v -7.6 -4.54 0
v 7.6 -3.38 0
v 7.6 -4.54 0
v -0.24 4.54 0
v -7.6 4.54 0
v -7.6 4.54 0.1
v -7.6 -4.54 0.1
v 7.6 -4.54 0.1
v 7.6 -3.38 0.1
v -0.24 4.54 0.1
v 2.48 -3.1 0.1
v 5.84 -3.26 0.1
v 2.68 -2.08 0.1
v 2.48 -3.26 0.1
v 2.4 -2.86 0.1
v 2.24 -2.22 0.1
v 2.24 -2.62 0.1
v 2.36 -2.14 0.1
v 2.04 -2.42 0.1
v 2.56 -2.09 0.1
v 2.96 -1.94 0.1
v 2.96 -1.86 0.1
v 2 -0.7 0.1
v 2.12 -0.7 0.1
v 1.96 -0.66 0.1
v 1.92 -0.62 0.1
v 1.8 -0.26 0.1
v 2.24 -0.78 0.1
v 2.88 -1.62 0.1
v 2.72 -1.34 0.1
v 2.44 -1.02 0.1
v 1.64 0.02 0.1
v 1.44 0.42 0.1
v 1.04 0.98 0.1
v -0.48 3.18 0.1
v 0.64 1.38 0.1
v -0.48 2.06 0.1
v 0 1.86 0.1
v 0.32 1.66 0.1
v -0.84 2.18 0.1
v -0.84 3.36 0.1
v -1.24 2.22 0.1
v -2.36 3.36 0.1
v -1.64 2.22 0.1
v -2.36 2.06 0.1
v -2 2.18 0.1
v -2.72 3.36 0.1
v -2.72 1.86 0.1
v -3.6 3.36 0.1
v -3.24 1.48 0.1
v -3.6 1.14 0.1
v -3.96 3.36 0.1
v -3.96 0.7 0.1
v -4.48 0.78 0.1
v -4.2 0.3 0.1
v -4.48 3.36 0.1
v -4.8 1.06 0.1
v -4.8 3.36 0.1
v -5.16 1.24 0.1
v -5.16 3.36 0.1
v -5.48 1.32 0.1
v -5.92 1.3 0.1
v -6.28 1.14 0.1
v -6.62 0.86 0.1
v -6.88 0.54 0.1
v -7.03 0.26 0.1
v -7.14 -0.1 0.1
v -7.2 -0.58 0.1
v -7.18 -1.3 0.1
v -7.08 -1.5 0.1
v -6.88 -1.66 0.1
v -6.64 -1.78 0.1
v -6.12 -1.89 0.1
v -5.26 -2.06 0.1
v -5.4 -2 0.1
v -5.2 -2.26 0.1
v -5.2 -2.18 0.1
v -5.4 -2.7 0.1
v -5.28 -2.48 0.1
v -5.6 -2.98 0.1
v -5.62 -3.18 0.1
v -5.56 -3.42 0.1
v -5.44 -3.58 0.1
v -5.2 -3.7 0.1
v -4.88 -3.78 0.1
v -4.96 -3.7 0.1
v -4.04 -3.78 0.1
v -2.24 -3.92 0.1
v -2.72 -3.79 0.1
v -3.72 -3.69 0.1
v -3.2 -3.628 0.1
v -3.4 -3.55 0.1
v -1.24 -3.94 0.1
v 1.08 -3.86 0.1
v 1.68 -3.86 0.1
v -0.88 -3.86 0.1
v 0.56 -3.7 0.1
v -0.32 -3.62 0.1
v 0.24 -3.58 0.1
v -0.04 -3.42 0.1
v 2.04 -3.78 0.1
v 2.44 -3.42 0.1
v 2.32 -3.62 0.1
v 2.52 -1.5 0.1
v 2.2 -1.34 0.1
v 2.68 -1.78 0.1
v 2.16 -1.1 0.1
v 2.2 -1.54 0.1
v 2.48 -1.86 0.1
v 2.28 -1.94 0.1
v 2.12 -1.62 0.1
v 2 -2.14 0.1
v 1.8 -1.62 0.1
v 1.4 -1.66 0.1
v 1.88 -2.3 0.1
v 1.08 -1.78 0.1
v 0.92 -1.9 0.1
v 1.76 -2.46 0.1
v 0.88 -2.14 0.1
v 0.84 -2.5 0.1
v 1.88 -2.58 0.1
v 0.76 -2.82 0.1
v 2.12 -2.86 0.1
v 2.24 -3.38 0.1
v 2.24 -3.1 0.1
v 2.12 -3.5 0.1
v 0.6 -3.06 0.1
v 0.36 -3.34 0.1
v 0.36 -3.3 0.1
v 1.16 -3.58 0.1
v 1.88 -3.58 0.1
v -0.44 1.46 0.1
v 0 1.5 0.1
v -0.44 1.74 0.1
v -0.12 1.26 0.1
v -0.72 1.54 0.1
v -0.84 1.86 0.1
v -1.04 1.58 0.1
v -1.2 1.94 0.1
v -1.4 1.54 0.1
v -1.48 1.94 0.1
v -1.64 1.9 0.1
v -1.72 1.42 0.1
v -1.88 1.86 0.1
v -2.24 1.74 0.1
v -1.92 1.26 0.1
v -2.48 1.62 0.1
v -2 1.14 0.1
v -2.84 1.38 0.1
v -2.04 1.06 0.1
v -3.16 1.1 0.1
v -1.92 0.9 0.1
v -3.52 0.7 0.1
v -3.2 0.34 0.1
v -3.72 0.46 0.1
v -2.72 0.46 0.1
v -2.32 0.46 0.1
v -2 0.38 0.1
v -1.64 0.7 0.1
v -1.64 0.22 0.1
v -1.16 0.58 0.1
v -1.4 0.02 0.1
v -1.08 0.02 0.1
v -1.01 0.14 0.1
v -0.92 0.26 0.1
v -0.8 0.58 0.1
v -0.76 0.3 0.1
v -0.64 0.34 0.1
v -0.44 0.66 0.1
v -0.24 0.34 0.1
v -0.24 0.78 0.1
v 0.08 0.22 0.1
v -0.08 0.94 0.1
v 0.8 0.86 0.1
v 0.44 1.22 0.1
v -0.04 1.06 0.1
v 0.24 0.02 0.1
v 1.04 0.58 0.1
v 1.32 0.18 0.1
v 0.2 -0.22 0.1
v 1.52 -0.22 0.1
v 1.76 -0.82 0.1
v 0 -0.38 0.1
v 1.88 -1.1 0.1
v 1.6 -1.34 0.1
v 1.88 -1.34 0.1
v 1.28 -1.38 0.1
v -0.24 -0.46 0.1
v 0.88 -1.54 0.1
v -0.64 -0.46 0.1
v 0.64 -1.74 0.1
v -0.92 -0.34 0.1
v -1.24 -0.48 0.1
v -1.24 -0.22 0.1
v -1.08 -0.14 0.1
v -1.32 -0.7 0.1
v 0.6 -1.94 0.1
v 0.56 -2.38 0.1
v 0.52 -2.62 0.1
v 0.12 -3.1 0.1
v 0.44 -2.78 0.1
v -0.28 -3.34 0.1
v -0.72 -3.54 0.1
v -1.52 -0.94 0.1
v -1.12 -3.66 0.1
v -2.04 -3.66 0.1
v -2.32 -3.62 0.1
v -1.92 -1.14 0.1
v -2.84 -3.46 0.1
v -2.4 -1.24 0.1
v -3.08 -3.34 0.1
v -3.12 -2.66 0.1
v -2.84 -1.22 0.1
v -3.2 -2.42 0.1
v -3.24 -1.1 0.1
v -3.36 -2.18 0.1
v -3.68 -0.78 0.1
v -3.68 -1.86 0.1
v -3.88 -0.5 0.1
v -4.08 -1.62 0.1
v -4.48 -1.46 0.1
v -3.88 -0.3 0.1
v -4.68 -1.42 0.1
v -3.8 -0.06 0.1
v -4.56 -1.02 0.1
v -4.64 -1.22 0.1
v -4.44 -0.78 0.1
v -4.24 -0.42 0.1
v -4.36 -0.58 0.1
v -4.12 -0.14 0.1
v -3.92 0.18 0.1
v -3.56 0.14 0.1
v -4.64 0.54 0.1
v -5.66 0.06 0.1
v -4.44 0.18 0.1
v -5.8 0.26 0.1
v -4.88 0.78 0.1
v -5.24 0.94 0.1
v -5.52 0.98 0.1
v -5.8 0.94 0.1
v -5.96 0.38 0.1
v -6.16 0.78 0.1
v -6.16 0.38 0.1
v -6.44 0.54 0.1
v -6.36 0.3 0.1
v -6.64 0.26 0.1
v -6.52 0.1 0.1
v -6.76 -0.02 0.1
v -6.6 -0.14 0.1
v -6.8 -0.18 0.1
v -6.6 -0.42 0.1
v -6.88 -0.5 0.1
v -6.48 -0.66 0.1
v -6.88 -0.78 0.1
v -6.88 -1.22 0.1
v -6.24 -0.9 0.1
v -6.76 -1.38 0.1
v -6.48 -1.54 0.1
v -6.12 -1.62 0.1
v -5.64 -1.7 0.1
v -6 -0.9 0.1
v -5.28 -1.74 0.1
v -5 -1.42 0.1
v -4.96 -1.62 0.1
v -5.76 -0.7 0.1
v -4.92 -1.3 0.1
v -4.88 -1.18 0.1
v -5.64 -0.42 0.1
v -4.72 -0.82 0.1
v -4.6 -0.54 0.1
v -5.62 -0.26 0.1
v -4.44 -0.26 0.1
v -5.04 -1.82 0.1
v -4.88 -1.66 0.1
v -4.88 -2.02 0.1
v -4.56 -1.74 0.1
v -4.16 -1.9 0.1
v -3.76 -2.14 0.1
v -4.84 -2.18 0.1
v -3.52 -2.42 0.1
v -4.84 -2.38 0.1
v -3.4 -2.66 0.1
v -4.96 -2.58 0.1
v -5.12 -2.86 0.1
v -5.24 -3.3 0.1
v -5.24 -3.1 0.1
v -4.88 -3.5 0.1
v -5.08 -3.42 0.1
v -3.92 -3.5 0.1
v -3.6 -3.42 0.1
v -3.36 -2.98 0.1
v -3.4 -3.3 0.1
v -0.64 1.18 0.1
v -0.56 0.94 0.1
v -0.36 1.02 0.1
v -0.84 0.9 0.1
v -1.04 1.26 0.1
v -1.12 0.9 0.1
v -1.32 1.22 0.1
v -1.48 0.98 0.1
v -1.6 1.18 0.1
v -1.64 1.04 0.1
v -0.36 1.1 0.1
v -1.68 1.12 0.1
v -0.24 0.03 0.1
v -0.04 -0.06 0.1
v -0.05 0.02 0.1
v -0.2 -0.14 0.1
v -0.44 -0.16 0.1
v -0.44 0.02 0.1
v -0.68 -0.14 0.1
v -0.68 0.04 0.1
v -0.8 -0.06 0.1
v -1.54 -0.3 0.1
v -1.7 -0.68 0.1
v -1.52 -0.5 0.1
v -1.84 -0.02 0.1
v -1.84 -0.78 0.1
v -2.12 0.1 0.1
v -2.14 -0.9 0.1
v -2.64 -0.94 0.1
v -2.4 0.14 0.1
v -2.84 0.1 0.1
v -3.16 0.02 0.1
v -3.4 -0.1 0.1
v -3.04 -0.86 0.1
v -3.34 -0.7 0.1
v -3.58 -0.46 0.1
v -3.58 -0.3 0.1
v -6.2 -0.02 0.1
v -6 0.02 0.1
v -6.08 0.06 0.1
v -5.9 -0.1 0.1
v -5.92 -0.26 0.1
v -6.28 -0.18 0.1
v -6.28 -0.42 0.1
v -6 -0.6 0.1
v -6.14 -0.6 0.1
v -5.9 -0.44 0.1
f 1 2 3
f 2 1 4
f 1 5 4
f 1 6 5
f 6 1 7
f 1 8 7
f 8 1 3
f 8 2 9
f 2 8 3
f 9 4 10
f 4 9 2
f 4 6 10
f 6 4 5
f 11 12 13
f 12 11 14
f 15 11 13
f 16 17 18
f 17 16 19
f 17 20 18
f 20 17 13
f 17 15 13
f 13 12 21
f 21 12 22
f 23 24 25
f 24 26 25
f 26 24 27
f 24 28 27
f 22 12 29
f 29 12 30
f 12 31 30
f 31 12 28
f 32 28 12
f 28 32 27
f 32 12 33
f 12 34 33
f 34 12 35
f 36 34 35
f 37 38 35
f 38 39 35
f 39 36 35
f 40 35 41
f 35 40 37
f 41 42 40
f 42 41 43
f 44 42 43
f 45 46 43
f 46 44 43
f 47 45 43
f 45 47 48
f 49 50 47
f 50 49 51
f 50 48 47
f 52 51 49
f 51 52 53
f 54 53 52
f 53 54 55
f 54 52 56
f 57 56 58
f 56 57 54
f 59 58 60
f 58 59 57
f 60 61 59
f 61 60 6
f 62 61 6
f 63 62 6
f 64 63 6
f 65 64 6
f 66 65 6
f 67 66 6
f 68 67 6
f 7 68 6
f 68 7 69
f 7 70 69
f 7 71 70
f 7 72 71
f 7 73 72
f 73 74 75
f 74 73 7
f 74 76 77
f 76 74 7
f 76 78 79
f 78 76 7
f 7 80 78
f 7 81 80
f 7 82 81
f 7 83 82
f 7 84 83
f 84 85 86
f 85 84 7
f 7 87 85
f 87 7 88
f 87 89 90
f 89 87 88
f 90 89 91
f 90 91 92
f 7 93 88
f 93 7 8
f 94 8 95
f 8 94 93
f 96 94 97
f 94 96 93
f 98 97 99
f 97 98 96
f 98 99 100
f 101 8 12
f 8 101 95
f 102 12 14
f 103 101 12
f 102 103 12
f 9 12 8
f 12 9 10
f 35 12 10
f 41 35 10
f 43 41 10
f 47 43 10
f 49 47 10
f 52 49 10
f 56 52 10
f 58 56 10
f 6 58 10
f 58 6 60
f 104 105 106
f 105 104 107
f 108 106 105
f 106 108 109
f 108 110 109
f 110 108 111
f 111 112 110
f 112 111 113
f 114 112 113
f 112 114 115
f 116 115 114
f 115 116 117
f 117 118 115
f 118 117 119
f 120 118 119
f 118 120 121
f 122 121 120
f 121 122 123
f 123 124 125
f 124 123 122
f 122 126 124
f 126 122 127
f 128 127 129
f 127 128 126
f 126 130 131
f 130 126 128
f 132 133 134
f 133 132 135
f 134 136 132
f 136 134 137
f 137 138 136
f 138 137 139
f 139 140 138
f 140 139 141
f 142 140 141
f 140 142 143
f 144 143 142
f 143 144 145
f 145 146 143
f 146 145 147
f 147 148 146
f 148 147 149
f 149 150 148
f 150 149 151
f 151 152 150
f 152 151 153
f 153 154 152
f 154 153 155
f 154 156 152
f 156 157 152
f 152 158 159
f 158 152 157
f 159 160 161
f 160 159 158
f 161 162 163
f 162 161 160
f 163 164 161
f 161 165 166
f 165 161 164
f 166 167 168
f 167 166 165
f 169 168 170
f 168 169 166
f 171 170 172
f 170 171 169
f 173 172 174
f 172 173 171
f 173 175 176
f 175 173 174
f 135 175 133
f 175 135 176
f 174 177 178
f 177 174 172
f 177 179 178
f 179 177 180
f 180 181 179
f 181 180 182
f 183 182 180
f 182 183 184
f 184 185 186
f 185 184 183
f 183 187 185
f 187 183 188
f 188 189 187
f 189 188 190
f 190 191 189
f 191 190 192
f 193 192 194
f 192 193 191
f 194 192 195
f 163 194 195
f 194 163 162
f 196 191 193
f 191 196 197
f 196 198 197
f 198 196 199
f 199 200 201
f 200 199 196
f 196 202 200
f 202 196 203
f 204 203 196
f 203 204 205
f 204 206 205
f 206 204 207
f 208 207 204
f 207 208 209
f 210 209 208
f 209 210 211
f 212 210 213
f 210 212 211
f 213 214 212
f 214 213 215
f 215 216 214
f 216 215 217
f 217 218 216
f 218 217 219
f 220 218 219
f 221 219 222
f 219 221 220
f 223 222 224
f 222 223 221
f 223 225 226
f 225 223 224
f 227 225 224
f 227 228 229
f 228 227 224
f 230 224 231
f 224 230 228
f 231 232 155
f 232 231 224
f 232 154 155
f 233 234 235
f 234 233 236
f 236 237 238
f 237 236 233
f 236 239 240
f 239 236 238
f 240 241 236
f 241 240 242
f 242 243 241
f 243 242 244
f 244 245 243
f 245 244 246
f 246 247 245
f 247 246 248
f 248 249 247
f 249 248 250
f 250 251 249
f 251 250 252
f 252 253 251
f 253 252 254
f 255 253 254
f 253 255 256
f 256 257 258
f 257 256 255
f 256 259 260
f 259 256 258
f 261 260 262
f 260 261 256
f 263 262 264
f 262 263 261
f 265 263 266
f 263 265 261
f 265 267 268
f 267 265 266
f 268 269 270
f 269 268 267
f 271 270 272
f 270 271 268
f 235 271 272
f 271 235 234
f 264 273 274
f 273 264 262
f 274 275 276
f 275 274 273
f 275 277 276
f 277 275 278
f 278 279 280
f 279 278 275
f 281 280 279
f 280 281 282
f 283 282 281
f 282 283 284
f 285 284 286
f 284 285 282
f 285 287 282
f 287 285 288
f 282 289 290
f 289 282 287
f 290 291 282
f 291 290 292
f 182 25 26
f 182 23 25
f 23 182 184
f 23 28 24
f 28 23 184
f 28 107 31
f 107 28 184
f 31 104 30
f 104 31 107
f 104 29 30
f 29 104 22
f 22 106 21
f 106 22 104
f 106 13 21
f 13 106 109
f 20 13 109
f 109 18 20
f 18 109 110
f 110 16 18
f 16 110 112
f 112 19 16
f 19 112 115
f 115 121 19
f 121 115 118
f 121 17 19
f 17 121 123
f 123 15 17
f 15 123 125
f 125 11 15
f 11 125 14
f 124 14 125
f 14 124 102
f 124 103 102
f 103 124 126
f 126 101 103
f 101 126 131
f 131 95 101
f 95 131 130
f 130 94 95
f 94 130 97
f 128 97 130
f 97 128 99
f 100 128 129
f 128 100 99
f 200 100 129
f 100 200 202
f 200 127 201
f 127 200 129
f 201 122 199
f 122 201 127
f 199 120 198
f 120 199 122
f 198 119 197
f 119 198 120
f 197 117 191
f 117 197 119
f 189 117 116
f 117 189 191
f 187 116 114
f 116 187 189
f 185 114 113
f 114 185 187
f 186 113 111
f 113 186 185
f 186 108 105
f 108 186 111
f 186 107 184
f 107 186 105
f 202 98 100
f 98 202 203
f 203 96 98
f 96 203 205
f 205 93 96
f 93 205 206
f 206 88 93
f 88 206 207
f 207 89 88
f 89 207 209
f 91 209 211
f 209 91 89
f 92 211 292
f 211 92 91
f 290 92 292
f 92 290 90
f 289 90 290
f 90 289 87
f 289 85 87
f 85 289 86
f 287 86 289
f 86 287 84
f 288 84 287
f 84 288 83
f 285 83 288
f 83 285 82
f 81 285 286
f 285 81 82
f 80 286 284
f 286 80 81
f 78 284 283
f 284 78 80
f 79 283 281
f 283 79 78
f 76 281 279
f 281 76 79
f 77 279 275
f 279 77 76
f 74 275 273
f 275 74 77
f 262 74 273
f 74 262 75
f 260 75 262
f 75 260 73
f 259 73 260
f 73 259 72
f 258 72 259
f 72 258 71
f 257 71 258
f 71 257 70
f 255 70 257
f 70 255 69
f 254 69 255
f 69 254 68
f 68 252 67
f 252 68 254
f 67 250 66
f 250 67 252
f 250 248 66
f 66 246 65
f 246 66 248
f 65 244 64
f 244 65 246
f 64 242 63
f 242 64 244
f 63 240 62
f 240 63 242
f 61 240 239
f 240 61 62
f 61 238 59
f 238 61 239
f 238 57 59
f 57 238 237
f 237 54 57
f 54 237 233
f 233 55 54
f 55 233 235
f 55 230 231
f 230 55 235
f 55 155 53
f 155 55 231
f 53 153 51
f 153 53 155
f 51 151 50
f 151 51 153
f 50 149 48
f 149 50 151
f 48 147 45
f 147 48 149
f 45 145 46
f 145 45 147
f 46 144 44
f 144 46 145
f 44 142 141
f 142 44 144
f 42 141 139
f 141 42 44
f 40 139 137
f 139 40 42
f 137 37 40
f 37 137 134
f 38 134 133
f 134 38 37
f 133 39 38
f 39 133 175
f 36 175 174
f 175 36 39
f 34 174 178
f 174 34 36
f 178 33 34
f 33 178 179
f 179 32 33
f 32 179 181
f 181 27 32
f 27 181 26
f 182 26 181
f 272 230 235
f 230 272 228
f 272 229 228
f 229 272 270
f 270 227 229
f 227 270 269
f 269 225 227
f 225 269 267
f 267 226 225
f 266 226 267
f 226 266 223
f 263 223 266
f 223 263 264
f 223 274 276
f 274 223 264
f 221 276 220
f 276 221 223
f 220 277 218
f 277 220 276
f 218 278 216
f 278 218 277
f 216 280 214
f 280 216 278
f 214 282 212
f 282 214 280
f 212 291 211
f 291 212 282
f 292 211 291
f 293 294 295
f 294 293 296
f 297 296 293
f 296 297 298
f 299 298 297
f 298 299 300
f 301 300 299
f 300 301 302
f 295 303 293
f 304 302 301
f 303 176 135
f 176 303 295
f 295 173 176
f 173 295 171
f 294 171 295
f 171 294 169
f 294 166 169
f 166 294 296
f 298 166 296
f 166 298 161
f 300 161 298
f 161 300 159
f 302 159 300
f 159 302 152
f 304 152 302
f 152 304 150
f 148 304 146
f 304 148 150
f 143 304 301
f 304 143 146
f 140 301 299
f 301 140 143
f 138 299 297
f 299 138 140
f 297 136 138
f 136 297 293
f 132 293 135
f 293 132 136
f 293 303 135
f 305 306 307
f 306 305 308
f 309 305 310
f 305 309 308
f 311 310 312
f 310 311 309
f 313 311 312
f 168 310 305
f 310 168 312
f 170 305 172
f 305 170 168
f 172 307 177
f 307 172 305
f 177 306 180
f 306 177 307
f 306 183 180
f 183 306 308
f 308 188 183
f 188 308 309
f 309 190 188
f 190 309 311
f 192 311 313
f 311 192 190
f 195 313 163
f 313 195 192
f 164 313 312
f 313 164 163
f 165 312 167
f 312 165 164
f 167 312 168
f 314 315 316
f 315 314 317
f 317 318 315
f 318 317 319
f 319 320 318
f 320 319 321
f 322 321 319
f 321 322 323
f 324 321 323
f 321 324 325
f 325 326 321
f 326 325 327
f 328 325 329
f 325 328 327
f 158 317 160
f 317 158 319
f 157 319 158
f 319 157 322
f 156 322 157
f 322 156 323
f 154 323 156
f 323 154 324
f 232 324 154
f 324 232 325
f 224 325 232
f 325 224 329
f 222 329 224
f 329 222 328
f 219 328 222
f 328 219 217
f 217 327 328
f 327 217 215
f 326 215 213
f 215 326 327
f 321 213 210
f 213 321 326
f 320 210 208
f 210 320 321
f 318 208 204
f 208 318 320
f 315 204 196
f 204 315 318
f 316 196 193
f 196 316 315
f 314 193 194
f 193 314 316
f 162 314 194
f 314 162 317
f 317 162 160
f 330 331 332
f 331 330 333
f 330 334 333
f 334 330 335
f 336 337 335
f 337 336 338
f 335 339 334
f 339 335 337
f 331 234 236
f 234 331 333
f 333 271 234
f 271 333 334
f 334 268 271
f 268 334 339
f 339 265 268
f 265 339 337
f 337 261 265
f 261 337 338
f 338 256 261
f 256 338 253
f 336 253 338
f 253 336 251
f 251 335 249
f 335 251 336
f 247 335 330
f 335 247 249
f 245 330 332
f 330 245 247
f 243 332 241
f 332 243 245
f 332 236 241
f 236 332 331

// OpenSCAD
use <../lib.scad>
use <168365a.scad>
function ldraw_lib__168365b() = [
// 0 Sticker  1.1 x  1.9 with Black Turtle on Red Background with Yellow Stripes, Sloped on Right Side
// 0 Name: 168365b.dat
// 0 Author: Max Martin Richter [MMR1988]
// 0 !LDRAW_ORG Part UPDATE 2019-03
// 0 !LICENSE Licensed under CC BY 4.0 : see CAreadme.txt
// 
// 0 BFC CERTIFY CCW
  [0,"BFC","CERTIFY"],
  [0,"BFC","CCW"],
// 
// 0 !KEYWORDS Set 8858-1
// 
// 0 !HISTORY 2019-12-27 [PTadmin] Official Update 2019-03
// 
// 
// 1 16 0 0 0 -1 0 0 0 1 0 0 0 1 168365a.dat
  [1,16,0,0,0,-1,0,0,0,1,0,0,0,1, ldraw_lib__168365a()],
];
module ldraw_lib__168365b(step=0, col=false, unit=2/5, alt=false, line=0.2, solid=!$preview)
    makepoly(ldraw_lib__168365b(), step=step, col=col, unit=unit, alt=alt, line=line, solid=solid);
ldraw_lib__168365b(line=0.2);
